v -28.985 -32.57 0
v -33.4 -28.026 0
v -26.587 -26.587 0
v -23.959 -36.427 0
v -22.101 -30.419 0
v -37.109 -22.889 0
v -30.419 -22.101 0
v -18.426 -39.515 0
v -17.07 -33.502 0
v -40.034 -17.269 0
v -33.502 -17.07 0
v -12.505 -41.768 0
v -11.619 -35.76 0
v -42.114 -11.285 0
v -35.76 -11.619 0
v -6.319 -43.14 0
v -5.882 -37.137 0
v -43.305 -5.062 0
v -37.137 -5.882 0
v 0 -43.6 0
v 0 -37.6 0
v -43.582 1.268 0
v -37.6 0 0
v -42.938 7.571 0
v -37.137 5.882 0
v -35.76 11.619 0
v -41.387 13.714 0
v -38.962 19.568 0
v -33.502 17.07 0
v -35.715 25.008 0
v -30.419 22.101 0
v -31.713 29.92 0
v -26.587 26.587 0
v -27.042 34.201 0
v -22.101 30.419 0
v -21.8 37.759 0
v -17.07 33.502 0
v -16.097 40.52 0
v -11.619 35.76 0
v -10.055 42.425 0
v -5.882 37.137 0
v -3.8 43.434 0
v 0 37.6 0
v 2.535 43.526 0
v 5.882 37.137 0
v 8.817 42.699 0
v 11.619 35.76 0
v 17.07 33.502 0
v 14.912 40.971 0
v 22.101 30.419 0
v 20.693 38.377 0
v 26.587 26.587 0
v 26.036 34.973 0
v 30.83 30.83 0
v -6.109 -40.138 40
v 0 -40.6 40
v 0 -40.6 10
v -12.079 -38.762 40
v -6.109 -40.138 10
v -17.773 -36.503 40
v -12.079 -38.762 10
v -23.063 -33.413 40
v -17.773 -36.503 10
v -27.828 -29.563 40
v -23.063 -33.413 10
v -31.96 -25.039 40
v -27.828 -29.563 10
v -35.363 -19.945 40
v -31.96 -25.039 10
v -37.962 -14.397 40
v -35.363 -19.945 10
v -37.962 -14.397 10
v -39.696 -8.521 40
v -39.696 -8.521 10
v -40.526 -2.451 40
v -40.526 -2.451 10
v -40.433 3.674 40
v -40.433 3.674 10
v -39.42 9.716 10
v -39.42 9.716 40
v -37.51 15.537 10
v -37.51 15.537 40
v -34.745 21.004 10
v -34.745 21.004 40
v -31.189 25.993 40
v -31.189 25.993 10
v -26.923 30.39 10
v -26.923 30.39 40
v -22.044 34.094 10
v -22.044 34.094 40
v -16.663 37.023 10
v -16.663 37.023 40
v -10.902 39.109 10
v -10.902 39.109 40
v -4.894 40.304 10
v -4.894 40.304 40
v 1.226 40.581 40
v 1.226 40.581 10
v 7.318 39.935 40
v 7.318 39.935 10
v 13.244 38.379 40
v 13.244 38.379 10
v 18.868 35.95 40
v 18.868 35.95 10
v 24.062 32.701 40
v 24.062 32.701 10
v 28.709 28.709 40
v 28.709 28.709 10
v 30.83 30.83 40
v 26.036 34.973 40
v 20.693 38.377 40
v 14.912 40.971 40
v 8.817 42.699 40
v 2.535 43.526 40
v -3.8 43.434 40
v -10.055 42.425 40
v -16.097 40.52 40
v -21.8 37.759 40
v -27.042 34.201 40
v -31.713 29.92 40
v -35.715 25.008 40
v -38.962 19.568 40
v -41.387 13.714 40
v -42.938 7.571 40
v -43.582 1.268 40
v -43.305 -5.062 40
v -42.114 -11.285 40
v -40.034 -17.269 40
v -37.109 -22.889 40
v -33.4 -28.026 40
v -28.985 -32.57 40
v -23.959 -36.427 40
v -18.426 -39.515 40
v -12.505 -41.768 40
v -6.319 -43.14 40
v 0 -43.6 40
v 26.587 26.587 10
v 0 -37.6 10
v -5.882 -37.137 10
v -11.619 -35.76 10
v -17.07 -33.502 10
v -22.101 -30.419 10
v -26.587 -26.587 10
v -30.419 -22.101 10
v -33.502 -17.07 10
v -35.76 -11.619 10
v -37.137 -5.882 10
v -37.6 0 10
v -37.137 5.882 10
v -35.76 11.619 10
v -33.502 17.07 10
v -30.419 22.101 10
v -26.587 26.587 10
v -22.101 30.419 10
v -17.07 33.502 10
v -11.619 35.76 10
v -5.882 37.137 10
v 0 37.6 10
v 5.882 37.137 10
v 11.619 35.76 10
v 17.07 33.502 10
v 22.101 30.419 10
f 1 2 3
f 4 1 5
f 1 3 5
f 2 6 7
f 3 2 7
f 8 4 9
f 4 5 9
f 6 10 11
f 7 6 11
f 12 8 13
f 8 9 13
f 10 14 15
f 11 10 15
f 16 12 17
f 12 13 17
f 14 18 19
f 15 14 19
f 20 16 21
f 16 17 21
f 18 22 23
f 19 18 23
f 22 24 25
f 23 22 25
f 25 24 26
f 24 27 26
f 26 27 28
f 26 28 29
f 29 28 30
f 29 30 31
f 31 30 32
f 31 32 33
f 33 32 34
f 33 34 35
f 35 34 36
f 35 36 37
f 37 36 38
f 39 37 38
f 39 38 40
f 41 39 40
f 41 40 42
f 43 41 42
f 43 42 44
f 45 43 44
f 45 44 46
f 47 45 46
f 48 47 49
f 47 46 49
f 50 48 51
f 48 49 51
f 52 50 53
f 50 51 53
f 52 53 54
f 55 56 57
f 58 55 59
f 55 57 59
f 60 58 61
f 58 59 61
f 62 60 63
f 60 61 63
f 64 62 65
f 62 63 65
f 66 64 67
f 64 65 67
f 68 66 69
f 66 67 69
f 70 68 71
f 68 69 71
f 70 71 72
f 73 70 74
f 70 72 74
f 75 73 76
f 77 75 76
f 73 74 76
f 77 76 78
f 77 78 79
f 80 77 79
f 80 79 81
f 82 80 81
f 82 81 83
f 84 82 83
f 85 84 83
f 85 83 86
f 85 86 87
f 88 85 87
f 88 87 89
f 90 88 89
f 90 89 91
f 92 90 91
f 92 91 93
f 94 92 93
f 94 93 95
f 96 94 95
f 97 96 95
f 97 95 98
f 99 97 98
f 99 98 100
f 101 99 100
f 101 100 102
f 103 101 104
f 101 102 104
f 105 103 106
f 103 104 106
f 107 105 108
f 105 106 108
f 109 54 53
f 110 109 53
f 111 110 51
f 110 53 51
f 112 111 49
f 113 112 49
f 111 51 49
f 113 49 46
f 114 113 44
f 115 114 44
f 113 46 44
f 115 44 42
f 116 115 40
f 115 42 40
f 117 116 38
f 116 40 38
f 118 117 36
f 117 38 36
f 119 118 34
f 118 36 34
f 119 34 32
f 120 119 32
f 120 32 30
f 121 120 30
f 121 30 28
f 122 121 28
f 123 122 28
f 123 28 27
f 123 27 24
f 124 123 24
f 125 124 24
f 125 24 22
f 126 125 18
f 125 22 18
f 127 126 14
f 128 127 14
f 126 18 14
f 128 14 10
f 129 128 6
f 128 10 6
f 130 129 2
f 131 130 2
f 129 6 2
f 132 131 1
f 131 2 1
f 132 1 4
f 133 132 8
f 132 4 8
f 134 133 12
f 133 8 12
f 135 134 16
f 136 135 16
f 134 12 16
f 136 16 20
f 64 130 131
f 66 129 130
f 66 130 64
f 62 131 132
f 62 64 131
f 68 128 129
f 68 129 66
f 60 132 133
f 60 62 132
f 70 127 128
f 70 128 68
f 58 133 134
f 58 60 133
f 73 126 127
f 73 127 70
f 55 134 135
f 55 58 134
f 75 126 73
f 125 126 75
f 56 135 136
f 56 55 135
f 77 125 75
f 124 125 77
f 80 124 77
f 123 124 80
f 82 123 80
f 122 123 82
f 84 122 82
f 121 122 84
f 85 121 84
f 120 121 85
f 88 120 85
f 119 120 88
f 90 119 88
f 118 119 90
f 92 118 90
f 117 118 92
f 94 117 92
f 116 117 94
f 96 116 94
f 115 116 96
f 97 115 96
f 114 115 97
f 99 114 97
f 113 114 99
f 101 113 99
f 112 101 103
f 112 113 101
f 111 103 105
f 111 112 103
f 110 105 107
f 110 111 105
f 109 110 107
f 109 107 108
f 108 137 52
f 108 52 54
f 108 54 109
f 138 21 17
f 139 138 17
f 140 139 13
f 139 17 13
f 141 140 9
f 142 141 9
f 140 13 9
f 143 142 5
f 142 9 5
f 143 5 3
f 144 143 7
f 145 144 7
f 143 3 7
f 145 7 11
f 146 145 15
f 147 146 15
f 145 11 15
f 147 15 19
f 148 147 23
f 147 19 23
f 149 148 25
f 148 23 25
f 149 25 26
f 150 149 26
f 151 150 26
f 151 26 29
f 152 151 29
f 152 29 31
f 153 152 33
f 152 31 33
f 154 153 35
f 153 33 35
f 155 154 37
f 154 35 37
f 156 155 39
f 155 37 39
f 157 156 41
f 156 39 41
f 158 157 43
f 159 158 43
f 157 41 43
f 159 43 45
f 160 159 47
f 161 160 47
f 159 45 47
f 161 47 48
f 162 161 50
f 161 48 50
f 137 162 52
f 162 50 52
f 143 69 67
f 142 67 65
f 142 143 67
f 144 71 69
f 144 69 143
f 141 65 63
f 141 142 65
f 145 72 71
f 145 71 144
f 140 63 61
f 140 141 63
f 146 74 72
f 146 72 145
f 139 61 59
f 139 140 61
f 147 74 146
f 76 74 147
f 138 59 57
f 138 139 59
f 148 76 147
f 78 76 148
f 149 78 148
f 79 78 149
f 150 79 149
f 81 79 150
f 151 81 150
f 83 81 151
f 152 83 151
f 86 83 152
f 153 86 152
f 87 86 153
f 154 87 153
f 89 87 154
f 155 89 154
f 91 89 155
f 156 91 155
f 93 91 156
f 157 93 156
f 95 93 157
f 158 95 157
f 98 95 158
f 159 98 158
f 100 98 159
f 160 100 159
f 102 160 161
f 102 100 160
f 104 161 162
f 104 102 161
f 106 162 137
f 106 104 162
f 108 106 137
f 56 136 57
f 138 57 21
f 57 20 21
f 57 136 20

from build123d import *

# Parameters (mm, degrees)
EXTRUDE_1_DEPTH      = 10
EXTRUDE_2_DEPTH      = 30
EXTRUDE_2_DEPTH_BACK = 10


with BuildPart() as part:
    # 草图1 → 凸台-拉伸1 (new body)
    with BuildSketch(Plane.XY):
        with BuildLine():
            Line((0, -40.6), (0, -37.6))
            ThreePointArc((0, -37.6), (-34.737870422, 14.388897057), (26.587214973, 26.587214973))
            Line((26.587214973, 26.587214973), (28.708535316, 28.708535316))
            ThreePointArc((28.708535316, 28.708535316), (-37.50950902, 15.536947354), (0, -40.6))
        make_face()
    extrude(amount=EXTRUDE_1_DEPTH)

    # 草图2 → 凸台-拉伸2 (add, two sides: drawn at the far end of the back side and taken through both)
    with BuildSketch(Plane.XY.offset(10).offset(-EXTRUDE_2_DEPTH_BACK)):
        with BuildLine():
            ThreePointArc((0, -40.6), (-37.50950902, 15.536947354), (28.708535316, 28.708535316))
            Line((28.708535316, 28.708535316), (30.82985566, 30.82985566))
            ThreePointArc((30.82985566, 30.82985566), (-40.281147617, 16.684997651), (0, -43.6))
            Line((0, -43.6), (0, -40.6))
        make_face()
    extrude(amount=EXTRUDE_2_DEPTH + EXTRUDE_2_DEPTH_BACK)


solid = part.part
